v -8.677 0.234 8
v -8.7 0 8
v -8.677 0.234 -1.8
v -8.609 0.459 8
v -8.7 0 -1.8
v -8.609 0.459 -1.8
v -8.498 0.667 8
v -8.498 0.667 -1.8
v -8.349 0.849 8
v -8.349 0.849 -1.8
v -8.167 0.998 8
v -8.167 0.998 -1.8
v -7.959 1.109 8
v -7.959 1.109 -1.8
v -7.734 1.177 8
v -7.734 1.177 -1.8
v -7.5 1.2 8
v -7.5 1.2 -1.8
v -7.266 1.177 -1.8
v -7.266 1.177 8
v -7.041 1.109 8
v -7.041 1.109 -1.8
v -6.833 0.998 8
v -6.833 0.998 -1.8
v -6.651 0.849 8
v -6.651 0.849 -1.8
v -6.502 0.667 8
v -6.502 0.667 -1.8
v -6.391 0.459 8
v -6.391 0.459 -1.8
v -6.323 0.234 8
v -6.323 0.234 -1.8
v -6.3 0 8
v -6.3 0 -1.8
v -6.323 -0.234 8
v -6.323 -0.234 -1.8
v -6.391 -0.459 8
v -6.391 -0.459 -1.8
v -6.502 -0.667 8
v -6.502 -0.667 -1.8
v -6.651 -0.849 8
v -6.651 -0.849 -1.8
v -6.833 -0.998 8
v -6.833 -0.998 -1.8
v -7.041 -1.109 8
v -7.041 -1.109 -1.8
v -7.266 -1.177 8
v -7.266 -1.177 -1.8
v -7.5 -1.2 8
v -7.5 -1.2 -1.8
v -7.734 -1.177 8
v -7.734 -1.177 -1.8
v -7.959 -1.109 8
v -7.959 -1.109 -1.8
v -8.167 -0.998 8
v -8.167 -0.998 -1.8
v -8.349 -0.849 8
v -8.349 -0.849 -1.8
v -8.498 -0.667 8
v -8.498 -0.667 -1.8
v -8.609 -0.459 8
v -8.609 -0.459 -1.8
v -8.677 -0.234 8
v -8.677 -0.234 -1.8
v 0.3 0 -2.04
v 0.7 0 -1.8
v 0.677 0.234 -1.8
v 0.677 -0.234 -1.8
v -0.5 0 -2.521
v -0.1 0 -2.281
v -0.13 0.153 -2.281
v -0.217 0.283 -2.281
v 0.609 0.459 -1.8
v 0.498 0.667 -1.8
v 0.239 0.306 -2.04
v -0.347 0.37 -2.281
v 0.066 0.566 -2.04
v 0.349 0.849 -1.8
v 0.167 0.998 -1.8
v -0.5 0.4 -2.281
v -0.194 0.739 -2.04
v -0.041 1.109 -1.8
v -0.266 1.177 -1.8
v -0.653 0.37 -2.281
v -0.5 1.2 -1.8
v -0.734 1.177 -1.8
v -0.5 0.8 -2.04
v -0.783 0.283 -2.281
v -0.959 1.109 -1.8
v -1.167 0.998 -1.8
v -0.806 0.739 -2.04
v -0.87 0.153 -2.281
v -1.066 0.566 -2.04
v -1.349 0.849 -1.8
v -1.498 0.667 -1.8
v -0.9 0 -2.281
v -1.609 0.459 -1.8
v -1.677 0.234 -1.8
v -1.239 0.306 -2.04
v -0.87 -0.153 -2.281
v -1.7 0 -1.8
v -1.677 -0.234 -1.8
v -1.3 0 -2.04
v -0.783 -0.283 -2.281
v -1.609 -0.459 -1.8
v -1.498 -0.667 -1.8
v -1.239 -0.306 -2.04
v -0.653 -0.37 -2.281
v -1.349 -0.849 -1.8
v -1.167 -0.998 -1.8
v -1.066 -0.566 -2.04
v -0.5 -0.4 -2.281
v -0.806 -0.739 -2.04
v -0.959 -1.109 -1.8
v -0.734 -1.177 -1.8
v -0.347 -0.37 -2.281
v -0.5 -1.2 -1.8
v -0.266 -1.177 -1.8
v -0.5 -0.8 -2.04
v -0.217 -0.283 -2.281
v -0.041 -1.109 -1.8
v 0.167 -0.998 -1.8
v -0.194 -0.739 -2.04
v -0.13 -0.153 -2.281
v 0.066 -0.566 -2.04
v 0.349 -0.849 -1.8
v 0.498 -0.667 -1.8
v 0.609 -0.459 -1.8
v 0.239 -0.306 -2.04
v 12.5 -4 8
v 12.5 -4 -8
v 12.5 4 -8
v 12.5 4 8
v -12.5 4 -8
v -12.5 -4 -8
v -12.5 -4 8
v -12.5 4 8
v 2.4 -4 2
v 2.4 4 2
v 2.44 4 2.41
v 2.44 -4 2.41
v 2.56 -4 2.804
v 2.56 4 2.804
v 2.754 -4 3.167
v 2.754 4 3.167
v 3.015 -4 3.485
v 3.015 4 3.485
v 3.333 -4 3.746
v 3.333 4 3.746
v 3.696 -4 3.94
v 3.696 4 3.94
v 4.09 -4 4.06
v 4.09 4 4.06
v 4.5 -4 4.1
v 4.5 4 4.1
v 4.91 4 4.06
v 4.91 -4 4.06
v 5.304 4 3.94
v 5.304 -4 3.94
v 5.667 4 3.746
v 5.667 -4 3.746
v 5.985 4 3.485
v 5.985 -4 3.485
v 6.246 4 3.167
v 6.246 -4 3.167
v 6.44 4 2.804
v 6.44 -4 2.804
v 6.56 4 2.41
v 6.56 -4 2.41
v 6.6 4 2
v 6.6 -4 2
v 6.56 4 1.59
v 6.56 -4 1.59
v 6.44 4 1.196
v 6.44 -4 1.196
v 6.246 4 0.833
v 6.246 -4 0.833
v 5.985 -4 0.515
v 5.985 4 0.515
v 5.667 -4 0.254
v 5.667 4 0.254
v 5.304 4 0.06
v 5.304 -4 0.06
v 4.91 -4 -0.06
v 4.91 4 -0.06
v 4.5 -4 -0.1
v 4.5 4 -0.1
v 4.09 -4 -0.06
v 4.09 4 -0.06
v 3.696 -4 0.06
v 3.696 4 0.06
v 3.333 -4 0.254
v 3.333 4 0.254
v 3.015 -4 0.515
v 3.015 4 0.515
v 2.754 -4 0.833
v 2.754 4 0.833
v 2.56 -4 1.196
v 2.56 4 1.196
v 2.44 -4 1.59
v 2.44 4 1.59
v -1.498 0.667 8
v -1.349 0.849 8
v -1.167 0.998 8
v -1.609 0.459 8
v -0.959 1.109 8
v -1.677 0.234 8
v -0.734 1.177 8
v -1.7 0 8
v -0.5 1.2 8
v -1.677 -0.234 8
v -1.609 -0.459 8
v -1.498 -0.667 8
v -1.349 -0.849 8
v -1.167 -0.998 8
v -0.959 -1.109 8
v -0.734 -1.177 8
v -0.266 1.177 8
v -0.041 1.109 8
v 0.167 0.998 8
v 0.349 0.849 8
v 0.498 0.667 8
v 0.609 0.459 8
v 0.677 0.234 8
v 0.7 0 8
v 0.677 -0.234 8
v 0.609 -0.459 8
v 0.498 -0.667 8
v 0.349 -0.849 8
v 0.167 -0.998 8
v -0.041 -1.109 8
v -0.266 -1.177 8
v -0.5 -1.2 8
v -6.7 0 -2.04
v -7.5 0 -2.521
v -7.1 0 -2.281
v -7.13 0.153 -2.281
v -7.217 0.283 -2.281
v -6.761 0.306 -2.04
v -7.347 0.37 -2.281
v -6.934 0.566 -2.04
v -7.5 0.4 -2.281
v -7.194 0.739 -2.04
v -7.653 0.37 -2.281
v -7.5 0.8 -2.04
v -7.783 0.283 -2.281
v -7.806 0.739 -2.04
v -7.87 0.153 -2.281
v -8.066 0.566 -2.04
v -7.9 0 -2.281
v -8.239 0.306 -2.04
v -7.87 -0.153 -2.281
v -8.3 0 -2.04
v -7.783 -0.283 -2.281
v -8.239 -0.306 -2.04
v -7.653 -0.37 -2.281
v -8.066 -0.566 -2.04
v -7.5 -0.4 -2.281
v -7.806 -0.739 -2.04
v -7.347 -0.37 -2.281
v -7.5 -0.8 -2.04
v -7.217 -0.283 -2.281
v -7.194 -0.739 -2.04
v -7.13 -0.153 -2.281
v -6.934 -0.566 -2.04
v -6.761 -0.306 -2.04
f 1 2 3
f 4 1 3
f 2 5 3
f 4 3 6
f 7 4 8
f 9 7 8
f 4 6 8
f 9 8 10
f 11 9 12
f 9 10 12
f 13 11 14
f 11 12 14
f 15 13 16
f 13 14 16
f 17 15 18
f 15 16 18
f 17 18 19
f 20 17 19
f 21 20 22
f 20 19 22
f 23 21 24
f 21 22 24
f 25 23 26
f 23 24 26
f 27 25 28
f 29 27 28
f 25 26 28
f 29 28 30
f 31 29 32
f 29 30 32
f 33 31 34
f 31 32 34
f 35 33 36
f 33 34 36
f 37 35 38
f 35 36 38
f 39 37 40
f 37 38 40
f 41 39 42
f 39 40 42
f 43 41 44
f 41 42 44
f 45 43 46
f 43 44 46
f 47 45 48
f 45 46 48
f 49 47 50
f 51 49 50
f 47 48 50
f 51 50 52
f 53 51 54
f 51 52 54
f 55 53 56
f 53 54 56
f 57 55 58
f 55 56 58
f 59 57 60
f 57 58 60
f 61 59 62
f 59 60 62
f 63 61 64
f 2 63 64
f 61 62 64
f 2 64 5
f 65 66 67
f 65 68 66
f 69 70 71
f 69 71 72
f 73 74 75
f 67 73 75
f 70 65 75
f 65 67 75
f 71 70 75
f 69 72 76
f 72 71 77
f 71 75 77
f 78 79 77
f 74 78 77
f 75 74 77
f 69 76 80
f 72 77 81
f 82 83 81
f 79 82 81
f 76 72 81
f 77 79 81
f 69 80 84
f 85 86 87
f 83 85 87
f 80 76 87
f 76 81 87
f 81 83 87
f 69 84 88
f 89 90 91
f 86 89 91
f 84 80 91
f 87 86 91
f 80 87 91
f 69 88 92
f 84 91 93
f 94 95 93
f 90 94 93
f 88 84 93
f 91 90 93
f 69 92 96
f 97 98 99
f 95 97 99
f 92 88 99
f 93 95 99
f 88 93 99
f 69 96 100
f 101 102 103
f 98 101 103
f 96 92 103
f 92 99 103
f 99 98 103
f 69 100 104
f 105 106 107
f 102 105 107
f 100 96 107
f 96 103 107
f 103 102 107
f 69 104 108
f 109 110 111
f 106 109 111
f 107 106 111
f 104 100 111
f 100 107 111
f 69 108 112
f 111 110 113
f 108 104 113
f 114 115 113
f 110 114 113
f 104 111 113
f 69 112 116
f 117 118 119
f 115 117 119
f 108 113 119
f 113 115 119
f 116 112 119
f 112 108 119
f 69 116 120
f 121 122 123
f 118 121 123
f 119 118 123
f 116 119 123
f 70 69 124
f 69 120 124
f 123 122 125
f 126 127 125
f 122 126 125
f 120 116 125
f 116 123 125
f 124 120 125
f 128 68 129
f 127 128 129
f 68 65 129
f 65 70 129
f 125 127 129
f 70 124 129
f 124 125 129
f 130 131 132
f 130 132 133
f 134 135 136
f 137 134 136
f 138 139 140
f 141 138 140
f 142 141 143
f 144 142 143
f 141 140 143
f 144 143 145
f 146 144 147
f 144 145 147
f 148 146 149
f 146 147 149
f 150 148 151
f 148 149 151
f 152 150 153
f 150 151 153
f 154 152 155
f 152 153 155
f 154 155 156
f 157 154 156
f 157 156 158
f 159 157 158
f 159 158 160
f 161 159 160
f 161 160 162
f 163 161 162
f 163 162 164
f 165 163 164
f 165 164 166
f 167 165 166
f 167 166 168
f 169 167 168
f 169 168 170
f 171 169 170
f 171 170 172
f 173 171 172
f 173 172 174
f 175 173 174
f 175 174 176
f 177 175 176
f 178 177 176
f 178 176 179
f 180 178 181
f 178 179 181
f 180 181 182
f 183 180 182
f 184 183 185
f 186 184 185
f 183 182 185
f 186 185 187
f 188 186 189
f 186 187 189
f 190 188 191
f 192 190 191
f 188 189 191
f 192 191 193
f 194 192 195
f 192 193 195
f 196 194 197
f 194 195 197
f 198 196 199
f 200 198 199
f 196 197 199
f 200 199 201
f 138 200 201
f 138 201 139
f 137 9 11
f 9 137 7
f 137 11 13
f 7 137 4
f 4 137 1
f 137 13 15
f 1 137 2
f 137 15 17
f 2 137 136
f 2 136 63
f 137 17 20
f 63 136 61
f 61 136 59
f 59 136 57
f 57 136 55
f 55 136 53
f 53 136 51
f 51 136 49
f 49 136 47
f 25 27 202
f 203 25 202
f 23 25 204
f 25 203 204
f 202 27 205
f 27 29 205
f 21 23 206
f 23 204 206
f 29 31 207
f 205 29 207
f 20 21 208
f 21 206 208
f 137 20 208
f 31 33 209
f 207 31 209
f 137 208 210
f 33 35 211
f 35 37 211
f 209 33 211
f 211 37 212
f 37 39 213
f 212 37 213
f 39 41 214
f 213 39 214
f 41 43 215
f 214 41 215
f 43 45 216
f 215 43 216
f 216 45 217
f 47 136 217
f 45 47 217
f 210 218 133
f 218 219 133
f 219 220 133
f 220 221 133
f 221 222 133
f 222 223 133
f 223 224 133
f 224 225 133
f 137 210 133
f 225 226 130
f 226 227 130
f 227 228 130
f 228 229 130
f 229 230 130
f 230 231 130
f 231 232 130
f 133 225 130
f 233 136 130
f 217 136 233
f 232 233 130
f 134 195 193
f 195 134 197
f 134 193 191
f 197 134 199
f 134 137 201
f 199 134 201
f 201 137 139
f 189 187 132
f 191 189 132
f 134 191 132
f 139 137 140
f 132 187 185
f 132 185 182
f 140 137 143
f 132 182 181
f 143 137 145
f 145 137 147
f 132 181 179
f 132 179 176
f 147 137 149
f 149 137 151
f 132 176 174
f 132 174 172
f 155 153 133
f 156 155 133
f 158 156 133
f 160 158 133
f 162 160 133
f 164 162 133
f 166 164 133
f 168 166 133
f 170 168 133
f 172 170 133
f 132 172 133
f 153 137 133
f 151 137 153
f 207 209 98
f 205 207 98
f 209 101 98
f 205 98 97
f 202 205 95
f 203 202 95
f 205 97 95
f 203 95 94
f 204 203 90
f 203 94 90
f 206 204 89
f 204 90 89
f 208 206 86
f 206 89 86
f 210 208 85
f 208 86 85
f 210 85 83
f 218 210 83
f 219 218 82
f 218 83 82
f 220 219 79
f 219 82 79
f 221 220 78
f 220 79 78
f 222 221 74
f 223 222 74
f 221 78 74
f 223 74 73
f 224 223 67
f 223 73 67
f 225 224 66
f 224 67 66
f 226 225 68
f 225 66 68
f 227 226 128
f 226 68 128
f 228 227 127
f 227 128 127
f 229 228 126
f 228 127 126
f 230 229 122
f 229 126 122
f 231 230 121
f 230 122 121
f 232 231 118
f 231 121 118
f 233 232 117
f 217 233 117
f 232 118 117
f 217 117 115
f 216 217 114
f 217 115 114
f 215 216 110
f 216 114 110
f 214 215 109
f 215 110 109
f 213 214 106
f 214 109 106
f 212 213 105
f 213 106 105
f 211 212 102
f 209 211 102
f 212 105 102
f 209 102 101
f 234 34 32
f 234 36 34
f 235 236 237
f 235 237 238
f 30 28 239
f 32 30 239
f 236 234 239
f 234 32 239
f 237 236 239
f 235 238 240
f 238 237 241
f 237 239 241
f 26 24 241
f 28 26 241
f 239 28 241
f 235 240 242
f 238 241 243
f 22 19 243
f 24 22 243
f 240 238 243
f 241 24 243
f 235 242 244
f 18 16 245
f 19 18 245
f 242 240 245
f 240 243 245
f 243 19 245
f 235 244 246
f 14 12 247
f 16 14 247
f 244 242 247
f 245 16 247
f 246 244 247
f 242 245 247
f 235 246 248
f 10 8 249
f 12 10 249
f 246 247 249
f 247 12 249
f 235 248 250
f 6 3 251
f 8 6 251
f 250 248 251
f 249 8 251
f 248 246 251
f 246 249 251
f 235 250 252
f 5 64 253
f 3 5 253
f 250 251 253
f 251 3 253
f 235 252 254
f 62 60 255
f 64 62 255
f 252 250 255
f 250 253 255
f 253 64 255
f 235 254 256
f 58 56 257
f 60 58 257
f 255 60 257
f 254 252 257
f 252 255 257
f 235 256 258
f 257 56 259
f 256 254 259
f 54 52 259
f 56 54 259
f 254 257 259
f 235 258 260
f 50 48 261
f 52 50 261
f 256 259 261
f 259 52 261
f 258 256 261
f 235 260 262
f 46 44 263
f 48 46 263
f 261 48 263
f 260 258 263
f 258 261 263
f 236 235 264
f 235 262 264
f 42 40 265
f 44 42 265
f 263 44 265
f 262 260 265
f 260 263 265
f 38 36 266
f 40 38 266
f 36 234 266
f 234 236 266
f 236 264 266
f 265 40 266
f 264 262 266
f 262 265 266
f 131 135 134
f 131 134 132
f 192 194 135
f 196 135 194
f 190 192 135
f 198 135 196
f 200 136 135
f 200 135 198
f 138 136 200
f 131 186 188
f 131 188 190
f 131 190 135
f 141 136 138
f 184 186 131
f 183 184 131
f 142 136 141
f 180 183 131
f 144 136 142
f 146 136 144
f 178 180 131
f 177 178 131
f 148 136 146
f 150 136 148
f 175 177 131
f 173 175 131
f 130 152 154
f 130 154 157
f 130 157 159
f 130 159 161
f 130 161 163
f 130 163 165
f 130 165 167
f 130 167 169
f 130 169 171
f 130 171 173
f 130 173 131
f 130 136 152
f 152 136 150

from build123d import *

# Parameters (mm, degrees)
F0_W     = 25
F0_H     = 16
F1_DEPTH = 4
F3_D     = 4.2
F3_DEPTH = 14.4
F3_TIP   = 1.2618073
F5_D     = 2.4
F5_DEPTH = 9.8
F5_TIP   = 0.7210327428


with BuildPart() as f1:
    # F0 (on Front) → F1 (new body, symmetric)
    with BuildSketch(Plane.XZ):
        Rectangle(F0_W, F0_H)
    extrude(amount=F1_DEPTH, both=True)

    # F3
    with Locations(Plane.XZ.offset(4)):
        with Locations((4.5, 2)):
            Hole(F3_D / 2, depth=F3_DEPTH)
            with Locations((0, 0, -(F3_DEPTH + F3_TIP / 2))):  # 118° drill point
                Cone(0, F3_D / 2, F3_TIP, mode=Mode.SUBTRACT)

    # F5
    with Locations(Plane.XY.offset(8)):
        with Locations((-0.5, 0), (-7.5, 0)):
            Hole(F5_D / 2, depth=F5_DEPTH)
            with Locations((0, 0, -(F5_DEPTH + F5_TIP / 2))):  # 118° drill point
                Cone(0, F5_D / 2, F5_TIP, mode=Mode.SUBTRACT)


solid = f1.part
